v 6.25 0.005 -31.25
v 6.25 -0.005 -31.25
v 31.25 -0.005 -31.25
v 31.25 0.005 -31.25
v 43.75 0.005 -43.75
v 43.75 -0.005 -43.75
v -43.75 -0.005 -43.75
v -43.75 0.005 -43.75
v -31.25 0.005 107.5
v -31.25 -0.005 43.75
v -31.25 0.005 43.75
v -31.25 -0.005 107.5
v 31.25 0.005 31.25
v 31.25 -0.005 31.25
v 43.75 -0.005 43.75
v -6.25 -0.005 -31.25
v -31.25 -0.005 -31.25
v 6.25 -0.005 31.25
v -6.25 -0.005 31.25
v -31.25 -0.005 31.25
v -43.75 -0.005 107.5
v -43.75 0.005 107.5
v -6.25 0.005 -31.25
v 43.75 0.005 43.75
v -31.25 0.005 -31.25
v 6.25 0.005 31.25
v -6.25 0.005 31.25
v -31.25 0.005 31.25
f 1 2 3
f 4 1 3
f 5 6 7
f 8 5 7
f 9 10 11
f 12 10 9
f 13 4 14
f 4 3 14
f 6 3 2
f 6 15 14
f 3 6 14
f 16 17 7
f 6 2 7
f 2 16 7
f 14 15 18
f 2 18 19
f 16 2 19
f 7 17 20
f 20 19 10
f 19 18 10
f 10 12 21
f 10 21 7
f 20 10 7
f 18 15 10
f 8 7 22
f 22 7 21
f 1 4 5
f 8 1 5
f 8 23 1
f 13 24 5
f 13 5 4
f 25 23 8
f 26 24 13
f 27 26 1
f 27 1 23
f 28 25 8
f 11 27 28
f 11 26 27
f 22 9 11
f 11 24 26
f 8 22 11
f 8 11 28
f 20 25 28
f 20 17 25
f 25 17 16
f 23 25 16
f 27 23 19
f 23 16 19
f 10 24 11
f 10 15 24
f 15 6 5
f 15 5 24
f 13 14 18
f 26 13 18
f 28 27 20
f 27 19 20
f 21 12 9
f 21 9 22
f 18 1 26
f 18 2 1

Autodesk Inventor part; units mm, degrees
ref_plane "YZ Plane" through (0, 0, 0) normal (1, 0, 0) x (0, 1, 0)
ref_plane "XZ Plane" through (0, 0, 0) normal (0, 1, 0) x (-1, 0, 0)
ref_plane "XY Plane" through (0, 0, 0) normal (0, 0, 1) x (1, 0, 0)
sketch "Sketch1" plane through (0, 0, 0) normal (0, 1, 0) x (-1, 0, 0)
  line L0 (-43.75, -43.75) -> (-43.75, 43.75)
  line L1 (-31.25, -31.25) -> (-31.25, 31.25)
  line L2 (43.75, -43.75) -> (43.75, 107.5)
  line L3 (31.25, -31.25) -> (31.25, 31.25)
  line L4 (6.25, -31.25) -> (6.25, 31.25)
  line L5 (-6.25, -31.25) -> (-6.25, 31.25)
  line L6 (31.25, -31.25) -> (6.25, -31.25)
  line L7 (-6.25, -31.25) -> (-31.25, -31.25)
  line L8 (-31.25, 31.25) -> (-6.25, 31.25)
  line L9 (6.25, 31.25) -> (31.25, 31.25)
  line L10 (31.25, 43.75) -> (31.25, 107.5)
  line L11 (31.25, 107.5) -> (43.75, 107.5)
  line L12 (-43.75, 43.75) -> (31.25, 43.75)
  line L13 (-43.75, -43.75) -> (43.75, -43.75)
  line L14 (0, -43.75) -> (0, 43.75) construction
  line L15 (-43.75, 0) -> (43.75, 0) construction
  circle A0 centre (0, 0) radius 75 construction
  point P0 (0, 0)
  dimension "d25" = 12.5
  dimension "d27" = 12.5
  dimension "d28" = 25
  dimension "d29" = 12.5
  dimension "d30" = 107.5
extrude "Extrusion1" add sketch "Sketch1" along normal mid plane 0.01
properties part number "Circle_Copper" material "Copper"
